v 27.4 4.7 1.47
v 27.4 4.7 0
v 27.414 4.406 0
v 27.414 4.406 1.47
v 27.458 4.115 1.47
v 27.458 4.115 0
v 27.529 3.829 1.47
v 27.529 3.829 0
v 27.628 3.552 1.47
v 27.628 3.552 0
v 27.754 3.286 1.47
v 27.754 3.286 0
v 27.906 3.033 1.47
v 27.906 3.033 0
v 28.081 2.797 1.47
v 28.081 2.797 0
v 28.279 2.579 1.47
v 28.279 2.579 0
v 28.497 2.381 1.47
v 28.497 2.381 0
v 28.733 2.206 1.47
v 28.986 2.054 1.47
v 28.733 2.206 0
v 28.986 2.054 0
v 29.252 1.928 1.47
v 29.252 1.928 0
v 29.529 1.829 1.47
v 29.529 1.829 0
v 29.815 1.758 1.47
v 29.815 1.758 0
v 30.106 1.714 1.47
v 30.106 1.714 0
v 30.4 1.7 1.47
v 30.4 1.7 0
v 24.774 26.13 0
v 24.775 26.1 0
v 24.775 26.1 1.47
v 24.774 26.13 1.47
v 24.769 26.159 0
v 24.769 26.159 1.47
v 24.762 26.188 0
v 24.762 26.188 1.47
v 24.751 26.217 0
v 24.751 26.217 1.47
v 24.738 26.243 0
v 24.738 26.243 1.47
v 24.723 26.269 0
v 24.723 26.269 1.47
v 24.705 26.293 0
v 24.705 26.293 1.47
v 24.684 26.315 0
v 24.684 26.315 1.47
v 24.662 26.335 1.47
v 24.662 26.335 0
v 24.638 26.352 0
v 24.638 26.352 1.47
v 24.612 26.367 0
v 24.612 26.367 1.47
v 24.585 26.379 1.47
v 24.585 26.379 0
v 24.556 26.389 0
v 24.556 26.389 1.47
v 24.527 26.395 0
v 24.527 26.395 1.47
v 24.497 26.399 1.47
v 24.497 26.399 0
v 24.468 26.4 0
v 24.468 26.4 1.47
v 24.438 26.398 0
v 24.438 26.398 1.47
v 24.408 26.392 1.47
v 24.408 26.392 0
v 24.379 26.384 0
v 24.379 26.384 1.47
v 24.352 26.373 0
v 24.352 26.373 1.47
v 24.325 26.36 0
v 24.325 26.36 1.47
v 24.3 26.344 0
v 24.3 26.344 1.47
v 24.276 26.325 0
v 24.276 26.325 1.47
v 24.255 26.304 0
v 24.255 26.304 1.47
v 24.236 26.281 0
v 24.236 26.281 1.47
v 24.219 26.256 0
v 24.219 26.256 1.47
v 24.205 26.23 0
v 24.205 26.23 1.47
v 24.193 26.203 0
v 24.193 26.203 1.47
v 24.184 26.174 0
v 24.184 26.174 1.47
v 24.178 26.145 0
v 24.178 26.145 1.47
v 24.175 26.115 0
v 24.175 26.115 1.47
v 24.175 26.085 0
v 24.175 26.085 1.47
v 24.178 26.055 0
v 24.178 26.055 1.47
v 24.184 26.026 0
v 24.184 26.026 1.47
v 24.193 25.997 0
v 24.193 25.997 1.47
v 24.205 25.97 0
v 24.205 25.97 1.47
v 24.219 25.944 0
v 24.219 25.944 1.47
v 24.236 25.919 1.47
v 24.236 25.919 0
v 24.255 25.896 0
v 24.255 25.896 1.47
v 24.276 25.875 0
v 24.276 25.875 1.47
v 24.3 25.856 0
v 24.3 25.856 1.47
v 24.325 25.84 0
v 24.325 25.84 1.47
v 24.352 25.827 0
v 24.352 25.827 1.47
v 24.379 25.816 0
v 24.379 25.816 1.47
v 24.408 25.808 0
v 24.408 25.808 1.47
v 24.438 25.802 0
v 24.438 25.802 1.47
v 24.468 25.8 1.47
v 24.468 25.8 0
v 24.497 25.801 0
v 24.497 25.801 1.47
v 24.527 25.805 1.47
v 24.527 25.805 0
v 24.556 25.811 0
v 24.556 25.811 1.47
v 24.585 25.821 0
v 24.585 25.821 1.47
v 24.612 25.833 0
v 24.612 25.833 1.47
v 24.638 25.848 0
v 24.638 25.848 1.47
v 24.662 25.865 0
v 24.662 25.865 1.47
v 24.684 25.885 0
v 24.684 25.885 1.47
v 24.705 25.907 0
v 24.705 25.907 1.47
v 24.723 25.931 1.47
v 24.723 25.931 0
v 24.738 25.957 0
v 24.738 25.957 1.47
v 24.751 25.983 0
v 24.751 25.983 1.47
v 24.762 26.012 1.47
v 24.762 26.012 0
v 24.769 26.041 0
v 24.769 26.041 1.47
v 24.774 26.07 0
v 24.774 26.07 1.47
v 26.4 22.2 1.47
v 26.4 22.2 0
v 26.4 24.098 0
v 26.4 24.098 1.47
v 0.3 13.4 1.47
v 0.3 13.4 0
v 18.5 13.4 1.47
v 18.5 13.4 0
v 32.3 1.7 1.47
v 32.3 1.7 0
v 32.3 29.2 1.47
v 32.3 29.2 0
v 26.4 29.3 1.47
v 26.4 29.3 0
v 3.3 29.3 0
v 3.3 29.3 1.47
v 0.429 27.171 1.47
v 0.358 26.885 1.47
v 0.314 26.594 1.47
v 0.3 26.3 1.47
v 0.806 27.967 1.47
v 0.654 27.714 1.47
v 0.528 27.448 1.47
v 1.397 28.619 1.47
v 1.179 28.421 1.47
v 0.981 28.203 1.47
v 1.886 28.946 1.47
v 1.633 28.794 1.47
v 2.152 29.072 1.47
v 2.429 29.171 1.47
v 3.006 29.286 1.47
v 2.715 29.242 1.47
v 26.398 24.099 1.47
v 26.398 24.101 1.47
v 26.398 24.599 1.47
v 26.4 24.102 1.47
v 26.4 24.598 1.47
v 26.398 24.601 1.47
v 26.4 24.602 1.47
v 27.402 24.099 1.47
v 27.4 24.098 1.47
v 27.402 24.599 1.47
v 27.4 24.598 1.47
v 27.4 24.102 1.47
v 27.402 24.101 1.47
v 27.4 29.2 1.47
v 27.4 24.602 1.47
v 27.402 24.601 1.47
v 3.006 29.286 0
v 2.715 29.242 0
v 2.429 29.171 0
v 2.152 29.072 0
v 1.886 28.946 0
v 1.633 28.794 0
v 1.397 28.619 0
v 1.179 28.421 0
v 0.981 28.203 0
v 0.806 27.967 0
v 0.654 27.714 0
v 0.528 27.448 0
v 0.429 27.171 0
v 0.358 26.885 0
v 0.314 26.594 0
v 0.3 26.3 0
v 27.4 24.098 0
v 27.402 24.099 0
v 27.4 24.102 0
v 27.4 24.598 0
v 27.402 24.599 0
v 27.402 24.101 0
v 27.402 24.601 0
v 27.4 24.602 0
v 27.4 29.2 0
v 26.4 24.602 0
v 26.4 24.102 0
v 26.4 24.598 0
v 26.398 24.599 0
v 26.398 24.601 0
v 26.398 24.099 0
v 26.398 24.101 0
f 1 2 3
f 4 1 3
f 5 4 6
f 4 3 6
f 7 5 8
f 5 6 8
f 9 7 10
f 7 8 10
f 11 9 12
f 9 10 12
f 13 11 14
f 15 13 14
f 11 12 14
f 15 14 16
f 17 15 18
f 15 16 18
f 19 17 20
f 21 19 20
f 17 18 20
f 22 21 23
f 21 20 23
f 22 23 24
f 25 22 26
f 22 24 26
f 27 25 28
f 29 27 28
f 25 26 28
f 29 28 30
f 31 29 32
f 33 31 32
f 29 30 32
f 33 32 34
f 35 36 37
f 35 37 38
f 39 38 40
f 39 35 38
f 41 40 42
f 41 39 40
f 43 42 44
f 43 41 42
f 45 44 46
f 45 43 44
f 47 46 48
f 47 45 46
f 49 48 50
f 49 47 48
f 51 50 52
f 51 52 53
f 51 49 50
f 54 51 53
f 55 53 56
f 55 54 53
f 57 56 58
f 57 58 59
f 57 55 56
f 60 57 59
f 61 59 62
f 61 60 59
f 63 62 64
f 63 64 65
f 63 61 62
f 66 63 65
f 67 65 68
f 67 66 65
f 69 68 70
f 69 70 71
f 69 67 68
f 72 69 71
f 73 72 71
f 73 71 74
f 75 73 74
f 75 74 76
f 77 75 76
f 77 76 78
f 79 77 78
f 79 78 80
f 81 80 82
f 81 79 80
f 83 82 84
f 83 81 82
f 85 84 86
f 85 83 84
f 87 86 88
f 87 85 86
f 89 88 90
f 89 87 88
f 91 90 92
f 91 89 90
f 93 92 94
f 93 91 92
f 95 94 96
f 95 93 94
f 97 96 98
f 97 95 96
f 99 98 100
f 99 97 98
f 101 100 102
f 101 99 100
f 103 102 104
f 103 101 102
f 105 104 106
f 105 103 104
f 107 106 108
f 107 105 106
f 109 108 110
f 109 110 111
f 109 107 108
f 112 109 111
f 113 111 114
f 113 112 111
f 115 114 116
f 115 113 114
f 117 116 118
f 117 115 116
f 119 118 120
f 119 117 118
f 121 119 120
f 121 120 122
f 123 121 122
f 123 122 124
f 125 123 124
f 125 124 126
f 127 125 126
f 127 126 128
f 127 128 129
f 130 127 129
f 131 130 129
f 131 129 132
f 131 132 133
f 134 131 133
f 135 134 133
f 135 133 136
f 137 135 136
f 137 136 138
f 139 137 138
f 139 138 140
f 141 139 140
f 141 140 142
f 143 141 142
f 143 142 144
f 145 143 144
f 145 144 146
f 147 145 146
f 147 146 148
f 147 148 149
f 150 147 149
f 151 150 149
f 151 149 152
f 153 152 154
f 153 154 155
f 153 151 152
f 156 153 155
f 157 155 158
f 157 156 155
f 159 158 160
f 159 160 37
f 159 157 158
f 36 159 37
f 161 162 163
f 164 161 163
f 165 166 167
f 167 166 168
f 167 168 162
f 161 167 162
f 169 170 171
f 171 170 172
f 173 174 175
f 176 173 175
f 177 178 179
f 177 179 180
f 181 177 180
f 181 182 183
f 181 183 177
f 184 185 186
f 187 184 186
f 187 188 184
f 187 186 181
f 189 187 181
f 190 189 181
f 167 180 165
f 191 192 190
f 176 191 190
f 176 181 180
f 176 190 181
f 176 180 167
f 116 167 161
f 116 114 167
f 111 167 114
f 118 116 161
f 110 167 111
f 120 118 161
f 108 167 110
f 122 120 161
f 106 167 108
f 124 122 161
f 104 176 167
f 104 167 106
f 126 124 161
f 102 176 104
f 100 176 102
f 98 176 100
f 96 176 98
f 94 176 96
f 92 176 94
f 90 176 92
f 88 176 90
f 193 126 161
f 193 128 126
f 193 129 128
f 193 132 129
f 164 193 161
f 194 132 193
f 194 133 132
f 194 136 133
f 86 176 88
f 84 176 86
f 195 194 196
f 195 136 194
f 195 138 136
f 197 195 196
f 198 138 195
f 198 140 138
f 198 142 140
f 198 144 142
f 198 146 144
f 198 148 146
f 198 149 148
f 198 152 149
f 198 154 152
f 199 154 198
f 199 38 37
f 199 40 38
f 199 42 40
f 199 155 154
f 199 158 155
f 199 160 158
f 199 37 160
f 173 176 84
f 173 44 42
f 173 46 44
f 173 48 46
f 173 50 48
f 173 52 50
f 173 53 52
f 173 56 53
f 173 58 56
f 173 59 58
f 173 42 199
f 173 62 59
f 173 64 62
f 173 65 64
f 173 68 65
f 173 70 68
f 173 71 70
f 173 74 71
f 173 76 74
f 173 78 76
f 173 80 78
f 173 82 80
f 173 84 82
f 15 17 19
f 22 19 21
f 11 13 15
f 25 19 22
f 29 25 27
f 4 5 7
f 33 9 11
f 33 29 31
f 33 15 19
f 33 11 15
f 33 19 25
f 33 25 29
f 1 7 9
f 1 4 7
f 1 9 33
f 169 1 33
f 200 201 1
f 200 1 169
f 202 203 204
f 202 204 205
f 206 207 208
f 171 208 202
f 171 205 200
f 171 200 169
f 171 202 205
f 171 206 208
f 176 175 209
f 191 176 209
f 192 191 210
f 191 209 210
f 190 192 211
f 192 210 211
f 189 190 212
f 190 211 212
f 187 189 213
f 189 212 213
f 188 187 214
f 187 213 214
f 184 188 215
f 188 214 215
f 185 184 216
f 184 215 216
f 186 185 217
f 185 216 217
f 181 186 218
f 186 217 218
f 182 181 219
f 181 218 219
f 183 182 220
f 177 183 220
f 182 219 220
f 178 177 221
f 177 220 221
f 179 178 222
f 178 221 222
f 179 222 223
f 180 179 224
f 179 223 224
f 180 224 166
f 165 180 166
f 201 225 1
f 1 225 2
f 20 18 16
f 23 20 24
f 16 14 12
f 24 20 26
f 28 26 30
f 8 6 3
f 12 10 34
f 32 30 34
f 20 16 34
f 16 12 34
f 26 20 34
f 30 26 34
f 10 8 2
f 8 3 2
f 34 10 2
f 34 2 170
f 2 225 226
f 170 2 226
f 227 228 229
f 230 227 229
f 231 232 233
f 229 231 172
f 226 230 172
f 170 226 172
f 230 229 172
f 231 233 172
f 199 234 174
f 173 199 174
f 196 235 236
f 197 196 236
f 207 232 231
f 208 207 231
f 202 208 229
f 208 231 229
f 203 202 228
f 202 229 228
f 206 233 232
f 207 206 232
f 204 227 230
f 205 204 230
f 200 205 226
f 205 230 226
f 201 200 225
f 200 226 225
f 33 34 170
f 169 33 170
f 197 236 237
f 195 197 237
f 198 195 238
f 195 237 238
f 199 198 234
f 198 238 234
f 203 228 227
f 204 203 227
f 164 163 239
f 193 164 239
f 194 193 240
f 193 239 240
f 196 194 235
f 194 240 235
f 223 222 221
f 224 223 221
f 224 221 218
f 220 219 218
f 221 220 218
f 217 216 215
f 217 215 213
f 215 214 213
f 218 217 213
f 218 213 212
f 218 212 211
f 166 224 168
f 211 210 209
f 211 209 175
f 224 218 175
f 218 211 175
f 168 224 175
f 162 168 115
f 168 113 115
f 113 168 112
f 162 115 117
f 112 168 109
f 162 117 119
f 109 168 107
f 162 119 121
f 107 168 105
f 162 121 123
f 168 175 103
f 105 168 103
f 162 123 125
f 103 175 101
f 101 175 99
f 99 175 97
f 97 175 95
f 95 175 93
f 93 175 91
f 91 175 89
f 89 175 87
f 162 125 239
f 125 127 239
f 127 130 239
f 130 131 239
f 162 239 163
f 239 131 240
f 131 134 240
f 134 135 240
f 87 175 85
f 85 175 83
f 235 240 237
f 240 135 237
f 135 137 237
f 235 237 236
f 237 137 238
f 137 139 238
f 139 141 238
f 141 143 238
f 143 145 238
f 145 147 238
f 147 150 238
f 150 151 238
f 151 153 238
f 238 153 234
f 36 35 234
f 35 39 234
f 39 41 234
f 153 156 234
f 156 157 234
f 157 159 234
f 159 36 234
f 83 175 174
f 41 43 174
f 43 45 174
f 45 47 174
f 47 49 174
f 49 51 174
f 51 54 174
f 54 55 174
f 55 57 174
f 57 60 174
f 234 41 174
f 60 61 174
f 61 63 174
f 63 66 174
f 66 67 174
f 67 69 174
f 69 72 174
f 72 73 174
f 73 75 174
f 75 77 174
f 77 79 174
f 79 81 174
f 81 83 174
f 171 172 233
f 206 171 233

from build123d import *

# Parameters (mm, degrees)
MODEL_R               = 0.3
BOSS_EXTRUDE1_DEPTH   = 1.47
BOSS_EXTRUDE1_2_DEPTH = 1.47


with BuildPart() as part:
    # Model → Boss-Extrude1 (new body)
    with BuildSketch(Plane.XY):
        with BuildLine():
            Line((0.3, 26.3), (0.3, 13.4))
            Line((0.3, 13.4), (18.5, 13.4))
            Line((18.5, 13.4), (26.4, 22.2))
            Line((26.4, 22.2), (26.4, 24.0975))
            ThreePointArc((26.4, 24.0975), (26.3975, 24.1), (26.4, 24.1025))
            Line((26.4, 24.1025), (26.4, 24.5975))
            ThreePointArc((26.4, 24.5975), (26.3975, 24.6), (26.4, 24.6025))
            Line((26.4, 24.6025), (26.4, 29.3))
            Line((26.4, 29.3), (3.3, 29.3))
            ThreePointArc((3.3, 29.3), (1.178679656, 28.421320344), (0.3, 26.3))
        make_face()
        with Locations((24.475, 26.1)):
            Circle(MODEL_R, mode=Mode.SUBTRACT)
    extrude(amount=BOSS_EXTRUDE1_DEPTH)


with BuildPart() as body_2:
    # Model → Boss-Extrude1 2 (new body)
    with BuildSketch(Plane.XY):
        with BuildLine():
            Line((32.3, 29.2), (27.4, 29.2))
            Line((27.4, 29.2), (27.4, 24.6025))
            ThreePointArc((27.4, 24.6025), (27.4025, 24.6), (27.4, 24.5975))
            Line((27.4, 24.5975), (27.4, 24.1025))
            ThreePointArc((27.4, 24.1025), (27.4025, 24.1), (27.4, 24.0975))
            Line((27.4, 24.0975), (27.4, 4.7))
            ThreePointArc((27.4, 4.7), (28.278679656, 2.578679656), (30.4, 1.7))
            Line((30.4, 1.7), (32.3, 1.7))
            Line((32.3, 1.7), (32.3, 29.2))
        make_face()
    extrude(amount=BOSS_EXTRUDE1_2_DEPTH)


solid = Compound([part.part, body_2.part])
